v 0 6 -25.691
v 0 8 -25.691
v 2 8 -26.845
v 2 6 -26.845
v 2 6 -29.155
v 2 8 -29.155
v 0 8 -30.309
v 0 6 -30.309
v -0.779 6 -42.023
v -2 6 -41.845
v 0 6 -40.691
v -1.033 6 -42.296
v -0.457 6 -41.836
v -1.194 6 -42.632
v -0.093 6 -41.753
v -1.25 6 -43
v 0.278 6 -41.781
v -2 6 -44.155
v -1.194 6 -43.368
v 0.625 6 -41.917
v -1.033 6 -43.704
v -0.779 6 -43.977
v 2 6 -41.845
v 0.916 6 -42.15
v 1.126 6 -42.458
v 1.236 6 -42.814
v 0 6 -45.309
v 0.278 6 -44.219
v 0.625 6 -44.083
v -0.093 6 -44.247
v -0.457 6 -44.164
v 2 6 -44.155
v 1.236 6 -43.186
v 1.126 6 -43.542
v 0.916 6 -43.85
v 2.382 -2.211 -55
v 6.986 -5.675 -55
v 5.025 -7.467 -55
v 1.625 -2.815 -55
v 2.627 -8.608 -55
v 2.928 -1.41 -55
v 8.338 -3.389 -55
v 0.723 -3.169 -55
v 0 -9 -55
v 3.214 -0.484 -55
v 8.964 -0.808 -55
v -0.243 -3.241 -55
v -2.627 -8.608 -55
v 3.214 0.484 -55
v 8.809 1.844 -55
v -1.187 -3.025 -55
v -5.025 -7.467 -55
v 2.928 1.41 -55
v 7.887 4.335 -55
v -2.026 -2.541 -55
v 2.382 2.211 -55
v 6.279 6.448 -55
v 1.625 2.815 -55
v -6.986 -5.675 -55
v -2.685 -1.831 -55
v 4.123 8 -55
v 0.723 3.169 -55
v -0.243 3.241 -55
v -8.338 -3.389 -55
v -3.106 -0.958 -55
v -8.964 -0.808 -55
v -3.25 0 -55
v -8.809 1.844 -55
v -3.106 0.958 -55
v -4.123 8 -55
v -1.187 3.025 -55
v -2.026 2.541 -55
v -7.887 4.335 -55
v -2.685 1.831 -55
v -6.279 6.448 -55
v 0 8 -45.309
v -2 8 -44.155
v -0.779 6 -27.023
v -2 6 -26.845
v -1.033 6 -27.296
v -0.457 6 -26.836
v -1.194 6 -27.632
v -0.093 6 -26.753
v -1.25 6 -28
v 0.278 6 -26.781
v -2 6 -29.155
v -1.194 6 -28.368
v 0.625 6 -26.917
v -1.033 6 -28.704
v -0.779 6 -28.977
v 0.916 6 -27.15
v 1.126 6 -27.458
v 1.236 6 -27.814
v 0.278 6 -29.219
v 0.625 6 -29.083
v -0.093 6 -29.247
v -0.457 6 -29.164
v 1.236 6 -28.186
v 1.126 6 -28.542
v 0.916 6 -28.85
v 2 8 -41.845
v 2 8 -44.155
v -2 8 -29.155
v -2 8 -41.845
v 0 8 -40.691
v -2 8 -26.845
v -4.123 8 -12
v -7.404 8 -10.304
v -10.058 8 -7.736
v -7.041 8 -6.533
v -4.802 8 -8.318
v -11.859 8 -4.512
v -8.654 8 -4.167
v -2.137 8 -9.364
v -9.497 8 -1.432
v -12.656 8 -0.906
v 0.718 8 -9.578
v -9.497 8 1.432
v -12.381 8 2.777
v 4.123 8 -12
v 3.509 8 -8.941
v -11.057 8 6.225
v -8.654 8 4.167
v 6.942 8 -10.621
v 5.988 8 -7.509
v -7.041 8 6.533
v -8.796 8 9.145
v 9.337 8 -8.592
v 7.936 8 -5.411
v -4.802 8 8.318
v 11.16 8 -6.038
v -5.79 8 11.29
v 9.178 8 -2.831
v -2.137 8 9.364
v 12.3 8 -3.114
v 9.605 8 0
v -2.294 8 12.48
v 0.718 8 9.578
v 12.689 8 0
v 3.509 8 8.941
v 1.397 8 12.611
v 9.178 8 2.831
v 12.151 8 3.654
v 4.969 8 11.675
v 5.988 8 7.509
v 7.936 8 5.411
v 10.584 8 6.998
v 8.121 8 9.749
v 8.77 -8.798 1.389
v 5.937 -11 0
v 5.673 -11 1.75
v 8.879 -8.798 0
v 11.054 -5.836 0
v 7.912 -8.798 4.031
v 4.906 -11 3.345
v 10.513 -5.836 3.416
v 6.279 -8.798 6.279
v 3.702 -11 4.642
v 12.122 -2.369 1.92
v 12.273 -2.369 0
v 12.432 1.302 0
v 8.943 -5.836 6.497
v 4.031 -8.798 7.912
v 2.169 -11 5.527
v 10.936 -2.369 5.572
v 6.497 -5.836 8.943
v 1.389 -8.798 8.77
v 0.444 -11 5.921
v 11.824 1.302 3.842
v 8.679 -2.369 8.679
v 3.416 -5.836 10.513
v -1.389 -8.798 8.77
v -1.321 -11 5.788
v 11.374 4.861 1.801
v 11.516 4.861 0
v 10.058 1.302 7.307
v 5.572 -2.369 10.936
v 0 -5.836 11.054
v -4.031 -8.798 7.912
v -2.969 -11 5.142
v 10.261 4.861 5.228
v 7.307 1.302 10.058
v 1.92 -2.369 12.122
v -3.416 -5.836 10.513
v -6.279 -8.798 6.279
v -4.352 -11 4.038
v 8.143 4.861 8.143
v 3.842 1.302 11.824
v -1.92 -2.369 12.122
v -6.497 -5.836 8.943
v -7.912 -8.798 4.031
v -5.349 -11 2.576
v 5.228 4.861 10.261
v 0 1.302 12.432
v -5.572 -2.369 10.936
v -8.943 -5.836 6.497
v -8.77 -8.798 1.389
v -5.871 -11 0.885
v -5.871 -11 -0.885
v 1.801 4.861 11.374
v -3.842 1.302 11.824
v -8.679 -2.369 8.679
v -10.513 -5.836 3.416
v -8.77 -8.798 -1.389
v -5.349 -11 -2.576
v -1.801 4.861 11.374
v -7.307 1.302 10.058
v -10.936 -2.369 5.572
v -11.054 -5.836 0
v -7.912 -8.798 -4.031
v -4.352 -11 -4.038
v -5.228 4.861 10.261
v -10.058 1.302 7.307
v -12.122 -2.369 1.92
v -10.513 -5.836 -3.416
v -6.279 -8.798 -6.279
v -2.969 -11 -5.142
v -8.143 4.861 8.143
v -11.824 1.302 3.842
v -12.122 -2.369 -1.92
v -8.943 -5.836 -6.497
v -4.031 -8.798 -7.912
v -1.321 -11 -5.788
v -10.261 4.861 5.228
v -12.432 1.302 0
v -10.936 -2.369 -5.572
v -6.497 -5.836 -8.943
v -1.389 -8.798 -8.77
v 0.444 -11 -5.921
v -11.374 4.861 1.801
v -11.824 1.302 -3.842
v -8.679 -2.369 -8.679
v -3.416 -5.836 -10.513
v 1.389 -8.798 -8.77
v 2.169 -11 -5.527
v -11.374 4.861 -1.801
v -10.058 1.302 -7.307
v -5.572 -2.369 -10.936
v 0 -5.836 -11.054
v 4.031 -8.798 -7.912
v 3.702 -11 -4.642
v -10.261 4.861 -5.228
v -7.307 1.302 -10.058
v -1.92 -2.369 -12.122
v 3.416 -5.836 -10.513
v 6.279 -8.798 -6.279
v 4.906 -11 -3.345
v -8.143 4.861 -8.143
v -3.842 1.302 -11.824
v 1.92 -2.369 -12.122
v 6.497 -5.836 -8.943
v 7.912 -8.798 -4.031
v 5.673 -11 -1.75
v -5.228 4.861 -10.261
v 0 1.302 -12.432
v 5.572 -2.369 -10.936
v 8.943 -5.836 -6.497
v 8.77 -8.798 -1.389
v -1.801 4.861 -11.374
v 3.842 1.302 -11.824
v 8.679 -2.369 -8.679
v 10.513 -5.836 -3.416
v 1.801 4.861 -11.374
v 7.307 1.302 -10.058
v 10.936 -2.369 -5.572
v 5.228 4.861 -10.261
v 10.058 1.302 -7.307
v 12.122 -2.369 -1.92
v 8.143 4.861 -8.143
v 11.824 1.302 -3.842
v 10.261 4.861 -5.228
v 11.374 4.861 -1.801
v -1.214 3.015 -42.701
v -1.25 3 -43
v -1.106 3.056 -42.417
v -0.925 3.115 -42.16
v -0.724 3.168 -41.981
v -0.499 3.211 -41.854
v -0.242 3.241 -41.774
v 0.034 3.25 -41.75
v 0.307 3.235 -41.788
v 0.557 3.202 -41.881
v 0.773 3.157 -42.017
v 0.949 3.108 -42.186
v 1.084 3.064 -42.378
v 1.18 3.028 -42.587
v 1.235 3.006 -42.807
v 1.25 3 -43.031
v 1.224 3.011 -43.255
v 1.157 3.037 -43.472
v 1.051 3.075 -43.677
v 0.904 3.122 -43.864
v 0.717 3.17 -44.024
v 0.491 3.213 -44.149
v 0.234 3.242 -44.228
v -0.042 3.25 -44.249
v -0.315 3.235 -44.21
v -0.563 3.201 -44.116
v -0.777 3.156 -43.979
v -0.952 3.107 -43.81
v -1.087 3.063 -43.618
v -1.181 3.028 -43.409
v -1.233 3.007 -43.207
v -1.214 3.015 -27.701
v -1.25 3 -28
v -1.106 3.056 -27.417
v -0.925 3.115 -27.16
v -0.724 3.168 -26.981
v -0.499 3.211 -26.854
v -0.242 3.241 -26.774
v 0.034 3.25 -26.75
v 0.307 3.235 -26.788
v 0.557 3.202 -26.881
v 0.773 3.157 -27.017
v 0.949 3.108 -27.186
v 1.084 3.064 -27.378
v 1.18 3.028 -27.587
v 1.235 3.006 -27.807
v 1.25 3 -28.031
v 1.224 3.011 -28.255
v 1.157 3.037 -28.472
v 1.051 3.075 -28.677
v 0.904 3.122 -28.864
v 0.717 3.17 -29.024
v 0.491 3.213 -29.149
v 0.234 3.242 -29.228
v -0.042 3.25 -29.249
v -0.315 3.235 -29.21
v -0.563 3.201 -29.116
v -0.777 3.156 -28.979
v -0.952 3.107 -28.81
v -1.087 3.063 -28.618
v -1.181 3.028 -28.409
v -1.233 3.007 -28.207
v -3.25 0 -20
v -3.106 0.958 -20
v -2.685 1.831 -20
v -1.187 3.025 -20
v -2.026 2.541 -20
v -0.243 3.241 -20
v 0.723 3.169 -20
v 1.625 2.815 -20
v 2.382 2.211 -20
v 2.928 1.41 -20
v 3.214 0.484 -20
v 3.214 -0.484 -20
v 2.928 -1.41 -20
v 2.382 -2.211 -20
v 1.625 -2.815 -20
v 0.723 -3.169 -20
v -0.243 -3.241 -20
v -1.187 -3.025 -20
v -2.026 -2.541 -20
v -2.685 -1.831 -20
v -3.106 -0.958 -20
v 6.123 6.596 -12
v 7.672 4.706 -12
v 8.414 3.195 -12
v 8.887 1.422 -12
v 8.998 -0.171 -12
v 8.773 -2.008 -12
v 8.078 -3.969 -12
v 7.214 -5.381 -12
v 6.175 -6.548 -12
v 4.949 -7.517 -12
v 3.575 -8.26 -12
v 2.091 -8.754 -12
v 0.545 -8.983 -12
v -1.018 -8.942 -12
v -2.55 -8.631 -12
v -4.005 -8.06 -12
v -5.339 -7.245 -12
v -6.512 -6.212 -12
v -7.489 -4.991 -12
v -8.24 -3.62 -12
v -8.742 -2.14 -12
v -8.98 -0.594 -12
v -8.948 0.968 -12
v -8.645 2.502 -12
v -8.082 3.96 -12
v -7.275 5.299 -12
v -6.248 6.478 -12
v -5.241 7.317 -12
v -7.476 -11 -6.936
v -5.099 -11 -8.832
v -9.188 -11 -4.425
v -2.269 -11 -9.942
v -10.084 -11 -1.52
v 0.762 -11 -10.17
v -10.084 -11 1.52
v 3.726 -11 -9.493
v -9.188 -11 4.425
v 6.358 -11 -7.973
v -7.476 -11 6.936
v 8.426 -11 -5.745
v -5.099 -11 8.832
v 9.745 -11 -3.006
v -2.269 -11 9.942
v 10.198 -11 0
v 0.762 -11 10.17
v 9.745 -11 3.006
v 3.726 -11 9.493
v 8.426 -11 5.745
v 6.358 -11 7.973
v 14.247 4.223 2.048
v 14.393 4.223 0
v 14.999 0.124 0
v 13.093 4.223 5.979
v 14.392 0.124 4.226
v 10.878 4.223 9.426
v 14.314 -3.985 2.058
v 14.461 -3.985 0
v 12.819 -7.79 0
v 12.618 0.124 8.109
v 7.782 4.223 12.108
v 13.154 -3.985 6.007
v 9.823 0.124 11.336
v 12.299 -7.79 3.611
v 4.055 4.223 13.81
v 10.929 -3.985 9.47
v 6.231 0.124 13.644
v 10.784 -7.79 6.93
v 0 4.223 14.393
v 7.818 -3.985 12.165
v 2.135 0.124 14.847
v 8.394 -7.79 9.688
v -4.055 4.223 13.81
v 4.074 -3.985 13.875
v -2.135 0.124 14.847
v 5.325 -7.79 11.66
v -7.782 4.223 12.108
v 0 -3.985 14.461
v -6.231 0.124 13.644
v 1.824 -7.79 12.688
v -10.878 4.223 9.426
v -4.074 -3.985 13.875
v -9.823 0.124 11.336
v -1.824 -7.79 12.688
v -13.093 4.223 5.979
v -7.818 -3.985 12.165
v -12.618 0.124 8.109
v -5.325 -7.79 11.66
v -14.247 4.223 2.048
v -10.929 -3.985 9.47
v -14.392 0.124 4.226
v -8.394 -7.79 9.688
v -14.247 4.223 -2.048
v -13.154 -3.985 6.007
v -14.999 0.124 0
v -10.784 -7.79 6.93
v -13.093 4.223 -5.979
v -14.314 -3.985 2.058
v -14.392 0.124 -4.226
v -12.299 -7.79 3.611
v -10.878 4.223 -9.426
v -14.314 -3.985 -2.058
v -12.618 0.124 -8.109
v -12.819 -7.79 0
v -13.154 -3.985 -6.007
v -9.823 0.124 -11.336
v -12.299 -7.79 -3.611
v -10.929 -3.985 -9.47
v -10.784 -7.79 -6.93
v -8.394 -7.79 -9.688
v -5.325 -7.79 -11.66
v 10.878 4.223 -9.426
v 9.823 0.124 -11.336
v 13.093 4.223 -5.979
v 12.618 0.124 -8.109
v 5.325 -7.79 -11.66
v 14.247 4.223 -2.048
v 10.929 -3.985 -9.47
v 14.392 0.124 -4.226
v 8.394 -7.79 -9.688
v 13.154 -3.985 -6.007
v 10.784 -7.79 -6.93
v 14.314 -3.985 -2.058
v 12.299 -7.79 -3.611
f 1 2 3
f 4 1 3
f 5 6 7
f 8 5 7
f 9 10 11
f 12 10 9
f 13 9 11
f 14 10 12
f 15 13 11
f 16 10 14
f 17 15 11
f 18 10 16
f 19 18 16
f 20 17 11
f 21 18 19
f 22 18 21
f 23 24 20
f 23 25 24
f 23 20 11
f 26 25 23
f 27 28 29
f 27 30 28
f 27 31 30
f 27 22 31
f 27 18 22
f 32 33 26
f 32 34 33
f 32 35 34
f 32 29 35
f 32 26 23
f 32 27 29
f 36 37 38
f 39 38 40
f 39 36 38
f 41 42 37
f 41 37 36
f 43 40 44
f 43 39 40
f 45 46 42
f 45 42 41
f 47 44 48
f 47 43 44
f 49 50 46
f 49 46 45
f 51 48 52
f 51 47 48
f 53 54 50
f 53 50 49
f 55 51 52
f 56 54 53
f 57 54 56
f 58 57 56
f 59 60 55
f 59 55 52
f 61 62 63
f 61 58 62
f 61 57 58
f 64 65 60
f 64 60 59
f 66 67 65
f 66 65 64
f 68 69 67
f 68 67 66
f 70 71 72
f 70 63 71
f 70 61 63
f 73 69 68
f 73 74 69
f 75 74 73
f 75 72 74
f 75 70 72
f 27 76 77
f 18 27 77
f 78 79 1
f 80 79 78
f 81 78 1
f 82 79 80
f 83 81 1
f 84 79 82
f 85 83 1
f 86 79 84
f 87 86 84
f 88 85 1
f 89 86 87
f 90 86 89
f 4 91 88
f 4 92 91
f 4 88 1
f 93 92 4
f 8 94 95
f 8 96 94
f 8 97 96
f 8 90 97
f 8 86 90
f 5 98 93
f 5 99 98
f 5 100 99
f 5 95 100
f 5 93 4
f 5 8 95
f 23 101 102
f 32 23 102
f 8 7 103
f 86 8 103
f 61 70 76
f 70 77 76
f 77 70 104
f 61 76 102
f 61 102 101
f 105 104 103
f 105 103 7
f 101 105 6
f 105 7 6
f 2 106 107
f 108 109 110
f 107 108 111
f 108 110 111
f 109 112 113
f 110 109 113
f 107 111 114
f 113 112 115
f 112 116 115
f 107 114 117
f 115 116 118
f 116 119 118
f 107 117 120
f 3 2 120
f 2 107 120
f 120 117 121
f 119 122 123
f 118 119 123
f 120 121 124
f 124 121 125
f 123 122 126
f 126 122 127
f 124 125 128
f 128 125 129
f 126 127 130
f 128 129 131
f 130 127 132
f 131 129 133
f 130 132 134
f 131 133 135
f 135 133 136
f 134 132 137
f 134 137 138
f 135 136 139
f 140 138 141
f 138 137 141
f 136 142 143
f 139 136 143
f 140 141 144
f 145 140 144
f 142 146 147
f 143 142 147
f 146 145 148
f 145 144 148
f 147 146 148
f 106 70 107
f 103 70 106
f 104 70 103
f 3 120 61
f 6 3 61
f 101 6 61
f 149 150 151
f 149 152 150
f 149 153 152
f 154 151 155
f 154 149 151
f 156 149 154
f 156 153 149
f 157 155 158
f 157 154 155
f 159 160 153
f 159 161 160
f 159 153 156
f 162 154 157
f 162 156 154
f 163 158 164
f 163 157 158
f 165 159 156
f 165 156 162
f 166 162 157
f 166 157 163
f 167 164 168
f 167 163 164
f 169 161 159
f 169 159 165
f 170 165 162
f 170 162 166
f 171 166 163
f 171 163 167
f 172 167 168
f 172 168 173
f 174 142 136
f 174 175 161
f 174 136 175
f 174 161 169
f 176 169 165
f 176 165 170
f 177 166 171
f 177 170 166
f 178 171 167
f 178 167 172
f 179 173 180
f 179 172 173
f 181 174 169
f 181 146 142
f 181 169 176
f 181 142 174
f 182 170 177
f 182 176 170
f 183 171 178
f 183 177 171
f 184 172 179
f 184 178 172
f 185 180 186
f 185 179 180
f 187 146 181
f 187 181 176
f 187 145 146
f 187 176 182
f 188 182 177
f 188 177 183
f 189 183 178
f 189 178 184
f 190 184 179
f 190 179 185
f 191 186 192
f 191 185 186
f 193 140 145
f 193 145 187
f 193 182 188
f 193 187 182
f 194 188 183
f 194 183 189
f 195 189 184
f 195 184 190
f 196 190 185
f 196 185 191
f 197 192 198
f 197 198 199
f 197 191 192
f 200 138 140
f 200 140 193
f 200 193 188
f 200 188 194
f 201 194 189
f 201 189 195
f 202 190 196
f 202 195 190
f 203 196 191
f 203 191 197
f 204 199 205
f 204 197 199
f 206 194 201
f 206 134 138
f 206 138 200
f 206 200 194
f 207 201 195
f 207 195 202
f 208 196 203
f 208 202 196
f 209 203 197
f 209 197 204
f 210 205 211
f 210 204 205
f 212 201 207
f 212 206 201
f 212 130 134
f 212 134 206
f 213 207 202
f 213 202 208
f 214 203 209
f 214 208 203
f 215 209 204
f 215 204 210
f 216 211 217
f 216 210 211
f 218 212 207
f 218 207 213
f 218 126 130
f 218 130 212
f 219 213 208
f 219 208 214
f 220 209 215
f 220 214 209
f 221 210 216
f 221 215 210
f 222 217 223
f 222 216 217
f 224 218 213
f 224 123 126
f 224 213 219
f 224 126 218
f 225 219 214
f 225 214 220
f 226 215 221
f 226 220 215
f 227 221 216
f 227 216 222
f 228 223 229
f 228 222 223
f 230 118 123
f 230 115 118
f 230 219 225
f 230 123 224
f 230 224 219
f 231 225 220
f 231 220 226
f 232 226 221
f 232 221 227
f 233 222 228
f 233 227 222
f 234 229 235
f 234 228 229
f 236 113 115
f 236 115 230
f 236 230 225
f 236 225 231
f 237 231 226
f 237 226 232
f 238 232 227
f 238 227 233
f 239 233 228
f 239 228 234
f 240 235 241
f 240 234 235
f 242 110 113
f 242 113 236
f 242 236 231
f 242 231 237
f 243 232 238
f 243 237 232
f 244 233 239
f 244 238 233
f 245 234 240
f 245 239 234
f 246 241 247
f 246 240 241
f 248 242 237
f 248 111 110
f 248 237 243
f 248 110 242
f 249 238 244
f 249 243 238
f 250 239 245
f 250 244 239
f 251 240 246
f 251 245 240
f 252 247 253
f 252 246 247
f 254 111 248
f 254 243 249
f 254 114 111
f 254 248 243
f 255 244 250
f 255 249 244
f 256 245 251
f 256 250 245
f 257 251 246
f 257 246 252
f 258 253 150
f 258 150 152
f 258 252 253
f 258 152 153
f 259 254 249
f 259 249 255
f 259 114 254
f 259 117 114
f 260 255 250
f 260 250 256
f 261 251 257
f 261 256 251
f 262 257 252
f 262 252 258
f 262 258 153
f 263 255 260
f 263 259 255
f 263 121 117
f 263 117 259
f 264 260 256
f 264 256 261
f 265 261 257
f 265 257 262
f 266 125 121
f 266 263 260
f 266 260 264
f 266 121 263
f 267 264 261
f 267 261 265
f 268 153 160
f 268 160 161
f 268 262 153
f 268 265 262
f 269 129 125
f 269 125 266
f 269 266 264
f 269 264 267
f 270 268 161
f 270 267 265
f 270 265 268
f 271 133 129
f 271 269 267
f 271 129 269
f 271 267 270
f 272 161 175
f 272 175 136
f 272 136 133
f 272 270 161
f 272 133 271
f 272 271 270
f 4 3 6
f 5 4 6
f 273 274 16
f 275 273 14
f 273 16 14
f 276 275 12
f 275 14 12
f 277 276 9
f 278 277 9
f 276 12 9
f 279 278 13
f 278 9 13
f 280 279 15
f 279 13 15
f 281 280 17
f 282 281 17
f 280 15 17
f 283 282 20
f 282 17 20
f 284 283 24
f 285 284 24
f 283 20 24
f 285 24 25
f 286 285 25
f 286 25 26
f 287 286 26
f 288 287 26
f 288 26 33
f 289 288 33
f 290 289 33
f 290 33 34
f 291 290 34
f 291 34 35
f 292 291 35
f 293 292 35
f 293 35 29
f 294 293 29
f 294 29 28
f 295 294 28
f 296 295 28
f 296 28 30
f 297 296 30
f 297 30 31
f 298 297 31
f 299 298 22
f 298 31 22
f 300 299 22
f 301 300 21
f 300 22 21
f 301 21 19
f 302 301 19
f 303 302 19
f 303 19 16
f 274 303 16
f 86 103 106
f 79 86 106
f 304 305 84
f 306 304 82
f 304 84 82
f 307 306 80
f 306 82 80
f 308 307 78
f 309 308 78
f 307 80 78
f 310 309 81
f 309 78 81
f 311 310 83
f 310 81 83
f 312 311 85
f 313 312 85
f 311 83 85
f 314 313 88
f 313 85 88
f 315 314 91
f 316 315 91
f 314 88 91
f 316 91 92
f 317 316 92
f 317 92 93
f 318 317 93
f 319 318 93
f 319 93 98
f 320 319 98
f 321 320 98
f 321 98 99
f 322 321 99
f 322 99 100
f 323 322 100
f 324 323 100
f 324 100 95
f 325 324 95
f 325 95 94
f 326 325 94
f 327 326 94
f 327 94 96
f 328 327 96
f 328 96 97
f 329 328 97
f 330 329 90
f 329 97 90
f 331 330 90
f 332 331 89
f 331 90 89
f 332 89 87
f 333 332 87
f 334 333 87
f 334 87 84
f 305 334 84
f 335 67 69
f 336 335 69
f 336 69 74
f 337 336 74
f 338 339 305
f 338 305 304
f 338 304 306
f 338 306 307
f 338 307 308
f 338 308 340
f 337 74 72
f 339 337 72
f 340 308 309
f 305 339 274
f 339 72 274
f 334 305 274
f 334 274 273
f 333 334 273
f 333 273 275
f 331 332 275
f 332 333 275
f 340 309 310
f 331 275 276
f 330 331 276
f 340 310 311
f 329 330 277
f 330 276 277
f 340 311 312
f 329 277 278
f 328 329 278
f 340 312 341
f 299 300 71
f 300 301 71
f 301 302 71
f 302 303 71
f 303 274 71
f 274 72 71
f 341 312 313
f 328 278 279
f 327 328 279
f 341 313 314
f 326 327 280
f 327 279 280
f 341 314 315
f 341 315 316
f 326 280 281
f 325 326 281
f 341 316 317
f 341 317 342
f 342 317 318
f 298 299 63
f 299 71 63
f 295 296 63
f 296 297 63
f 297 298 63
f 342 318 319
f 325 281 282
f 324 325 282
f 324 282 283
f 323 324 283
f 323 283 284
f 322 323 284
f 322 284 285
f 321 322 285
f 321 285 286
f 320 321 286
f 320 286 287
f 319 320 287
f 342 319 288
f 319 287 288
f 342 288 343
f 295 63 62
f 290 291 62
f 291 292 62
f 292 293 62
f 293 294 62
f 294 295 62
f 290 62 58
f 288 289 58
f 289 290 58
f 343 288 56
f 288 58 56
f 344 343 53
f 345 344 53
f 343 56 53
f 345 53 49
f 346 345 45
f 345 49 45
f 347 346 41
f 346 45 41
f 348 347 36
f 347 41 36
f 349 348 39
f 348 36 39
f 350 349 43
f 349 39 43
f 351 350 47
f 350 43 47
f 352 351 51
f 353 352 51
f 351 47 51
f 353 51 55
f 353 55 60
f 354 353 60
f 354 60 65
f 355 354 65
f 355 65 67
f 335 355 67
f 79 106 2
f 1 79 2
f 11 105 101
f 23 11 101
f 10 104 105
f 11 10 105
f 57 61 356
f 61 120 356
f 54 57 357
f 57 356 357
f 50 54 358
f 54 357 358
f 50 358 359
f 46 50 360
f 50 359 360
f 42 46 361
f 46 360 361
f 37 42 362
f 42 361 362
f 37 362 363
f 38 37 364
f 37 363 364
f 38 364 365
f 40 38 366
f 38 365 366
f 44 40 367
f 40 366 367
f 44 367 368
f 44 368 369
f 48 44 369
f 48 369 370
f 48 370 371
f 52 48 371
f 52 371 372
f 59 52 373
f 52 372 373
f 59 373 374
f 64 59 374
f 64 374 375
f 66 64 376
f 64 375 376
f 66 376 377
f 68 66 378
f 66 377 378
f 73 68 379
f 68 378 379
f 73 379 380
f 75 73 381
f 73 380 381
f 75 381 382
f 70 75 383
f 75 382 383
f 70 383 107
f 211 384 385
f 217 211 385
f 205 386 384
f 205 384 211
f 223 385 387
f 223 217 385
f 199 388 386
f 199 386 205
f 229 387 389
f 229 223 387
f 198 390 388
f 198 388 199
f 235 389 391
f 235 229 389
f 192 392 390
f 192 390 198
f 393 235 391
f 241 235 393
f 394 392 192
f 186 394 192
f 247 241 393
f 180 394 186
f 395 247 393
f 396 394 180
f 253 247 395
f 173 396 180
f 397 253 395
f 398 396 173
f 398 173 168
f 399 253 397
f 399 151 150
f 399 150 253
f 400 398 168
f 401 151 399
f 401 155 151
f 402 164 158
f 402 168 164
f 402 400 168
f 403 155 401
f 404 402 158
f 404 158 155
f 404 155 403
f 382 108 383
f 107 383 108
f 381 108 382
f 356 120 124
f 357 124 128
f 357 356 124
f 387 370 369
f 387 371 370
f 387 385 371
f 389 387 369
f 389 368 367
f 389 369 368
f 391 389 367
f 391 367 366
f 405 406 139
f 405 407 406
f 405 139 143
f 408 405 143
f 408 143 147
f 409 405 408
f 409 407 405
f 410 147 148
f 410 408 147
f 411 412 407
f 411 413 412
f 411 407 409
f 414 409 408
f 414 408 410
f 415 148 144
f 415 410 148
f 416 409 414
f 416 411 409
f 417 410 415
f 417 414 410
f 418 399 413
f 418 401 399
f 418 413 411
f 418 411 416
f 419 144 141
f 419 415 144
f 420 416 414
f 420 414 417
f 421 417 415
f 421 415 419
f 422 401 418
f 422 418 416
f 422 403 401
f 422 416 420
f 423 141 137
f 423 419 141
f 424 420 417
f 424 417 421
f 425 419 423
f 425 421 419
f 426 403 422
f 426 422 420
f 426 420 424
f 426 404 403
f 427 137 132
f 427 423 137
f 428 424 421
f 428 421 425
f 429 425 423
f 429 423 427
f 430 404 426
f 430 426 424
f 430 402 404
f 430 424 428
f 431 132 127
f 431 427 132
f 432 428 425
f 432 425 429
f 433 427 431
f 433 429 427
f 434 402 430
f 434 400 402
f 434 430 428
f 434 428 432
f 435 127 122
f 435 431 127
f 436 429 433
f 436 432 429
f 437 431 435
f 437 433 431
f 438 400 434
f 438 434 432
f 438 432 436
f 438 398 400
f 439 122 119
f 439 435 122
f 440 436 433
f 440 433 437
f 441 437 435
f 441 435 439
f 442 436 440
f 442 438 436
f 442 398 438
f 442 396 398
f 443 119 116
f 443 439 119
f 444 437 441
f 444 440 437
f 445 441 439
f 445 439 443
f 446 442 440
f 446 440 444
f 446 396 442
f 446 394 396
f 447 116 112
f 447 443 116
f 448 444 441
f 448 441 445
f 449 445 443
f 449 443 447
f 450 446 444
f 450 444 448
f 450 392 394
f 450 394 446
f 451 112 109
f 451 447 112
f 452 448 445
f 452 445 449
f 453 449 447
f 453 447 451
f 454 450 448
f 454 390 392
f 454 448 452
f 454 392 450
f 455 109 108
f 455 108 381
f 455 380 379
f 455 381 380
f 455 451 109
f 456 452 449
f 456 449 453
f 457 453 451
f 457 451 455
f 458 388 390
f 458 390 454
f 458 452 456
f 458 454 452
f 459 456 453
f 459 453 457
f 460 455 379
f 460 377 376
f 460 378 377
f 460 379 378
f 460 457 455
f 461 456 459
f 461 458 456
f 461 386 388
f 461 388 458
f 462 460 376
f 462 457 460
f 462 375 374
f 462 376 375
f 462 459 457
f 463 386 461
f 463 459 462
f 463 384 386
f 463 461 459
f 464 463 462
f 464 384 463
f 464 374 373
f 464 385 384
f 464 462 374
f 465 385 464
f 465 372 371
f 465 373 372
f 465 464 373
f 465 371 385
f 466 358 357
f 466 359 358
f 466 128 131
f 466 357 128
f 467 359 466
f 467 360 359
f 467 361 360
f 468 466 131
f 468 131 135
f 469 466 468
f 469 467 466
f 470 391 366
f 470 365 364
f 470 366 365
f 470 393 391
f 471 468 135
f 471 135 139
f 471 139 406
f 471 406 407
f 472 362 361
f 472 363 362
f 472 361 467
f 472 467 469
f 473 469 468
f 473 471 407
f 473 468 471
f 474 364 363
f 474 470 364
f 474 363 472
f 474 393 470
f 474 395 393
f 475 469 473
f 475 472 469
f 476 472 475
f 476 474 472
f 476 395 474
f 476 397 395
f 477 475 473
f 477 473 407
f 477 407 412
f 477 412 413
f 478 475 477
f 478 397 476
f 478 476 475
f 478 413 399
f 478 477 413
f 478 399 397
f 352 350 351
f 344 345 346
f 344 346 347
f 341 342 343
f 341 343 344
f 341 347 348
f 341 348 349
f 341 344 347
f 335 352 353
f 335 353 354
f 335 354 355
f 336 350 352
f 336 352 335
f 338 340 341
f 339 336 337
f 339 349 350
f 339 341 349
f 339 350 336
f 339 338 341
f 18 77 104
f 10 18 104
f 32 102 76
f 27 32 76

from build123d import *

# Parameters (mm, degrees)
BOSS_EXTRUDE2_REACH             = 37.299
BOSS_EXTRUDE2_END_RADIUS        = 15
BOSS_EXTRUDE2_DIRECTION_2_DEPTH = 40
SKETCH3_R                       = 3.25
CUT_EXTRUDE1_DEPTH              = 35
SKETCH4_R                       = 1.25
CUT_EXTRUDE3_DEPTH              = 2
CUT_EXTRUDE4_REACH              = 62.092
CUT_EXTRUDE4_END_RADIUS         = 3.25
SKETCH4_3_R                     = 1.25


with BuildPart() as part:
    # Sketch1 → Revolve1 (revolve)
    with BuildSketch(Plane.XY):
        with BuildLine():
            Line((9.604686356, 8), (12.68857754, 8))
            ThreePointArc((12.68857754, 8), (14.872770572, -1.949537258), (10.198039027, -11))
            Line((10.198039027, -11), (5.937171044, -11))
            ThreePointArc((5.937171044, -11), (12.27344014, -2.369106824), (9.604686356, 8))
        make_face()
    revolve(axis=Axis((0, 10, 0), (0, -1, 0)))

    # Boss-Extrude2: up to this sphere (the profile starts outside it)
    boss_extrude2_end = Location((0, 0, 0)) * Sphere(BOSS_EXTRUDE2_END_RADIUS, mode=Mode.PRIVATE)
    # Sketch2 → Boss-Extrude2 (add, up to the surface)
    with BuildSketch(Plane(origin=(0, 0, -15), x_dir=(-1, 0, 0), z_dir=(0, 0, -1)), mode=Mode.PRIVATE) as boss_extrude2_sk1:
        with BuildLine():
            Line((4.123105626, 8), (-4.123105626, 8))
            ThreePointArc((-4.123105626, 8), (0, -9), (4.123105626, 8))
        make_face()
    boss_extrude2_tool1 = extrude(boss_extrude2_sk1.sketch, amount=-BOSS_EXTRUDE2_REACH, mode=Mode.PRIVATE) - boss_extrude2_end
    add(boss_extrude2_tool1.solids().sort_by_distance((0, -0.187735, -15))[0])

    # Sketch2 → Boss-Extrude2 direction 2 (add)
    with BuildSketch(Plane(origin=(0, 0, -15), x_dir=(-1, 0, 0), z_dir=(0, 0, -1))):
        with BuildLine():
            Line((4.123105626, 8), (-4.123105626, 8))
            ThreePointArc((-4.123105626, 8), (0, -9), (4.123105626, 8))
        make_face()
    extrude(amount=BOSS_EXTRUDE2_DIRECTION_2_DEPTH)

    # Sketch3 → Cut-Extrude1 (cut)
    with BuildSketch(Plane(origin=(0, 0, -55), x_dir=(-1, 0, 0), z_dir=(0, 0, -1))):
        Circle(SKETCH3_R)
    extrude(amount=-CUT_EXTRUDE1_DEPTH, mode=Mode.SUBTRACT)

    # Sketch4 → Cut-Extrude3 (cut)
    # profile 1 of 2: a face of its own
    with BuildSketch(Plane(origin=(0, 8, 0), x_dir=(1, 0, 0), z_dir=(0, 1, 0))):
        Polygon((-2, 26.845299462), (0, 25.690598923), (2, 26.845299462), (2, 29.154700538), (0, 30.309401077), (-2, 29.154700538), align=None)
        with Locations(Location((0, 28, 0), (0, 0, 180))):
            Circle(SKETCH4_R, mode=Mode.SUBTRACT)
    # profile 2 of 2: a face of its own
    with BuildSketch(Plane(origin=(0, 8, 0), x_dir=(1, 0, 0), z_dir=(0, 1, 0))):
        Polygon((-2, 41.845299462), (0, 40.690598923), (2, 41.845299462), (2, 44.154700538), (0, 45.309401077), (-2, 44.154700538), align=None)
        with Locations(Location((0, 43, 0), (0, 0, 180))):
            Circle(SKETCH4_R, mode=Mode.SUBTRACT)
    extrude(amount=-CUT_EXTRUDE3_DEPTH, mode=Mode.SUBTRACT)

    # Cut-Extrude4: up to this cylinder (the profile starts outside it)
    cut_extrude4_end = Plane(origin=(0, 0, -35.5), z_dir=(0, 0, -1)) * Cylinder(CUT_EXTRUDE4_END_RADIUS, 146.684, mode=Mode.PRIVATE)
    # Sketch4<3> → Cut-Extrude4 (cut, up to the surface)
    with BuildSketch(Plane(origin=(0, 8, 0), x_dir=(1, 0, 0), z_dir=(0, 1, 0)), mode=Mode.PRIVATE) as cut_extrude4_sk1:
        with Locations(Location((0, 28, 0), (0, 0, 180))):
            Circle(SKETCH4_3_R)
    cut_extrude4_tool1 = extrude(cut_extrude4_sk1.sketch, amount=-CUT_EXTRUDE4_REACH, mode=Mode.PRIVATE) - cut_extrude4_end
    add(cut_extrude4_tool1.solids().sort_by_distance((0, 8, -28))[0], mode=Mode.SUBTRACT)
    # Sketch4<3> → Cut-Extrude4 (cut, up to the surface)
    with BuildSketch(Plane(origin=(0, 8, 0), x_dir=(1, 0, 0), z_dir=(0, 1, 0)), mode=Mode.PRIVATE) as cut_extrude4_sk2:
        with Locations(Location((0, 43, 0), (0, 0, 180))):
            Circle(SKETCH4_3_R)
    cut_extrude4_tool2 = extrude(cut_extrude4_sk2.sketch, amount=-CUT_EXTRUDE4_REACH, mode=Mode.PRIVATE) - cut_extrude4_end
    add(cut_extrude4_tool2.solids().sort_by_distance((0, 8, -43))[0], mode=Mode.SUBTRACT)


solid = part.part
